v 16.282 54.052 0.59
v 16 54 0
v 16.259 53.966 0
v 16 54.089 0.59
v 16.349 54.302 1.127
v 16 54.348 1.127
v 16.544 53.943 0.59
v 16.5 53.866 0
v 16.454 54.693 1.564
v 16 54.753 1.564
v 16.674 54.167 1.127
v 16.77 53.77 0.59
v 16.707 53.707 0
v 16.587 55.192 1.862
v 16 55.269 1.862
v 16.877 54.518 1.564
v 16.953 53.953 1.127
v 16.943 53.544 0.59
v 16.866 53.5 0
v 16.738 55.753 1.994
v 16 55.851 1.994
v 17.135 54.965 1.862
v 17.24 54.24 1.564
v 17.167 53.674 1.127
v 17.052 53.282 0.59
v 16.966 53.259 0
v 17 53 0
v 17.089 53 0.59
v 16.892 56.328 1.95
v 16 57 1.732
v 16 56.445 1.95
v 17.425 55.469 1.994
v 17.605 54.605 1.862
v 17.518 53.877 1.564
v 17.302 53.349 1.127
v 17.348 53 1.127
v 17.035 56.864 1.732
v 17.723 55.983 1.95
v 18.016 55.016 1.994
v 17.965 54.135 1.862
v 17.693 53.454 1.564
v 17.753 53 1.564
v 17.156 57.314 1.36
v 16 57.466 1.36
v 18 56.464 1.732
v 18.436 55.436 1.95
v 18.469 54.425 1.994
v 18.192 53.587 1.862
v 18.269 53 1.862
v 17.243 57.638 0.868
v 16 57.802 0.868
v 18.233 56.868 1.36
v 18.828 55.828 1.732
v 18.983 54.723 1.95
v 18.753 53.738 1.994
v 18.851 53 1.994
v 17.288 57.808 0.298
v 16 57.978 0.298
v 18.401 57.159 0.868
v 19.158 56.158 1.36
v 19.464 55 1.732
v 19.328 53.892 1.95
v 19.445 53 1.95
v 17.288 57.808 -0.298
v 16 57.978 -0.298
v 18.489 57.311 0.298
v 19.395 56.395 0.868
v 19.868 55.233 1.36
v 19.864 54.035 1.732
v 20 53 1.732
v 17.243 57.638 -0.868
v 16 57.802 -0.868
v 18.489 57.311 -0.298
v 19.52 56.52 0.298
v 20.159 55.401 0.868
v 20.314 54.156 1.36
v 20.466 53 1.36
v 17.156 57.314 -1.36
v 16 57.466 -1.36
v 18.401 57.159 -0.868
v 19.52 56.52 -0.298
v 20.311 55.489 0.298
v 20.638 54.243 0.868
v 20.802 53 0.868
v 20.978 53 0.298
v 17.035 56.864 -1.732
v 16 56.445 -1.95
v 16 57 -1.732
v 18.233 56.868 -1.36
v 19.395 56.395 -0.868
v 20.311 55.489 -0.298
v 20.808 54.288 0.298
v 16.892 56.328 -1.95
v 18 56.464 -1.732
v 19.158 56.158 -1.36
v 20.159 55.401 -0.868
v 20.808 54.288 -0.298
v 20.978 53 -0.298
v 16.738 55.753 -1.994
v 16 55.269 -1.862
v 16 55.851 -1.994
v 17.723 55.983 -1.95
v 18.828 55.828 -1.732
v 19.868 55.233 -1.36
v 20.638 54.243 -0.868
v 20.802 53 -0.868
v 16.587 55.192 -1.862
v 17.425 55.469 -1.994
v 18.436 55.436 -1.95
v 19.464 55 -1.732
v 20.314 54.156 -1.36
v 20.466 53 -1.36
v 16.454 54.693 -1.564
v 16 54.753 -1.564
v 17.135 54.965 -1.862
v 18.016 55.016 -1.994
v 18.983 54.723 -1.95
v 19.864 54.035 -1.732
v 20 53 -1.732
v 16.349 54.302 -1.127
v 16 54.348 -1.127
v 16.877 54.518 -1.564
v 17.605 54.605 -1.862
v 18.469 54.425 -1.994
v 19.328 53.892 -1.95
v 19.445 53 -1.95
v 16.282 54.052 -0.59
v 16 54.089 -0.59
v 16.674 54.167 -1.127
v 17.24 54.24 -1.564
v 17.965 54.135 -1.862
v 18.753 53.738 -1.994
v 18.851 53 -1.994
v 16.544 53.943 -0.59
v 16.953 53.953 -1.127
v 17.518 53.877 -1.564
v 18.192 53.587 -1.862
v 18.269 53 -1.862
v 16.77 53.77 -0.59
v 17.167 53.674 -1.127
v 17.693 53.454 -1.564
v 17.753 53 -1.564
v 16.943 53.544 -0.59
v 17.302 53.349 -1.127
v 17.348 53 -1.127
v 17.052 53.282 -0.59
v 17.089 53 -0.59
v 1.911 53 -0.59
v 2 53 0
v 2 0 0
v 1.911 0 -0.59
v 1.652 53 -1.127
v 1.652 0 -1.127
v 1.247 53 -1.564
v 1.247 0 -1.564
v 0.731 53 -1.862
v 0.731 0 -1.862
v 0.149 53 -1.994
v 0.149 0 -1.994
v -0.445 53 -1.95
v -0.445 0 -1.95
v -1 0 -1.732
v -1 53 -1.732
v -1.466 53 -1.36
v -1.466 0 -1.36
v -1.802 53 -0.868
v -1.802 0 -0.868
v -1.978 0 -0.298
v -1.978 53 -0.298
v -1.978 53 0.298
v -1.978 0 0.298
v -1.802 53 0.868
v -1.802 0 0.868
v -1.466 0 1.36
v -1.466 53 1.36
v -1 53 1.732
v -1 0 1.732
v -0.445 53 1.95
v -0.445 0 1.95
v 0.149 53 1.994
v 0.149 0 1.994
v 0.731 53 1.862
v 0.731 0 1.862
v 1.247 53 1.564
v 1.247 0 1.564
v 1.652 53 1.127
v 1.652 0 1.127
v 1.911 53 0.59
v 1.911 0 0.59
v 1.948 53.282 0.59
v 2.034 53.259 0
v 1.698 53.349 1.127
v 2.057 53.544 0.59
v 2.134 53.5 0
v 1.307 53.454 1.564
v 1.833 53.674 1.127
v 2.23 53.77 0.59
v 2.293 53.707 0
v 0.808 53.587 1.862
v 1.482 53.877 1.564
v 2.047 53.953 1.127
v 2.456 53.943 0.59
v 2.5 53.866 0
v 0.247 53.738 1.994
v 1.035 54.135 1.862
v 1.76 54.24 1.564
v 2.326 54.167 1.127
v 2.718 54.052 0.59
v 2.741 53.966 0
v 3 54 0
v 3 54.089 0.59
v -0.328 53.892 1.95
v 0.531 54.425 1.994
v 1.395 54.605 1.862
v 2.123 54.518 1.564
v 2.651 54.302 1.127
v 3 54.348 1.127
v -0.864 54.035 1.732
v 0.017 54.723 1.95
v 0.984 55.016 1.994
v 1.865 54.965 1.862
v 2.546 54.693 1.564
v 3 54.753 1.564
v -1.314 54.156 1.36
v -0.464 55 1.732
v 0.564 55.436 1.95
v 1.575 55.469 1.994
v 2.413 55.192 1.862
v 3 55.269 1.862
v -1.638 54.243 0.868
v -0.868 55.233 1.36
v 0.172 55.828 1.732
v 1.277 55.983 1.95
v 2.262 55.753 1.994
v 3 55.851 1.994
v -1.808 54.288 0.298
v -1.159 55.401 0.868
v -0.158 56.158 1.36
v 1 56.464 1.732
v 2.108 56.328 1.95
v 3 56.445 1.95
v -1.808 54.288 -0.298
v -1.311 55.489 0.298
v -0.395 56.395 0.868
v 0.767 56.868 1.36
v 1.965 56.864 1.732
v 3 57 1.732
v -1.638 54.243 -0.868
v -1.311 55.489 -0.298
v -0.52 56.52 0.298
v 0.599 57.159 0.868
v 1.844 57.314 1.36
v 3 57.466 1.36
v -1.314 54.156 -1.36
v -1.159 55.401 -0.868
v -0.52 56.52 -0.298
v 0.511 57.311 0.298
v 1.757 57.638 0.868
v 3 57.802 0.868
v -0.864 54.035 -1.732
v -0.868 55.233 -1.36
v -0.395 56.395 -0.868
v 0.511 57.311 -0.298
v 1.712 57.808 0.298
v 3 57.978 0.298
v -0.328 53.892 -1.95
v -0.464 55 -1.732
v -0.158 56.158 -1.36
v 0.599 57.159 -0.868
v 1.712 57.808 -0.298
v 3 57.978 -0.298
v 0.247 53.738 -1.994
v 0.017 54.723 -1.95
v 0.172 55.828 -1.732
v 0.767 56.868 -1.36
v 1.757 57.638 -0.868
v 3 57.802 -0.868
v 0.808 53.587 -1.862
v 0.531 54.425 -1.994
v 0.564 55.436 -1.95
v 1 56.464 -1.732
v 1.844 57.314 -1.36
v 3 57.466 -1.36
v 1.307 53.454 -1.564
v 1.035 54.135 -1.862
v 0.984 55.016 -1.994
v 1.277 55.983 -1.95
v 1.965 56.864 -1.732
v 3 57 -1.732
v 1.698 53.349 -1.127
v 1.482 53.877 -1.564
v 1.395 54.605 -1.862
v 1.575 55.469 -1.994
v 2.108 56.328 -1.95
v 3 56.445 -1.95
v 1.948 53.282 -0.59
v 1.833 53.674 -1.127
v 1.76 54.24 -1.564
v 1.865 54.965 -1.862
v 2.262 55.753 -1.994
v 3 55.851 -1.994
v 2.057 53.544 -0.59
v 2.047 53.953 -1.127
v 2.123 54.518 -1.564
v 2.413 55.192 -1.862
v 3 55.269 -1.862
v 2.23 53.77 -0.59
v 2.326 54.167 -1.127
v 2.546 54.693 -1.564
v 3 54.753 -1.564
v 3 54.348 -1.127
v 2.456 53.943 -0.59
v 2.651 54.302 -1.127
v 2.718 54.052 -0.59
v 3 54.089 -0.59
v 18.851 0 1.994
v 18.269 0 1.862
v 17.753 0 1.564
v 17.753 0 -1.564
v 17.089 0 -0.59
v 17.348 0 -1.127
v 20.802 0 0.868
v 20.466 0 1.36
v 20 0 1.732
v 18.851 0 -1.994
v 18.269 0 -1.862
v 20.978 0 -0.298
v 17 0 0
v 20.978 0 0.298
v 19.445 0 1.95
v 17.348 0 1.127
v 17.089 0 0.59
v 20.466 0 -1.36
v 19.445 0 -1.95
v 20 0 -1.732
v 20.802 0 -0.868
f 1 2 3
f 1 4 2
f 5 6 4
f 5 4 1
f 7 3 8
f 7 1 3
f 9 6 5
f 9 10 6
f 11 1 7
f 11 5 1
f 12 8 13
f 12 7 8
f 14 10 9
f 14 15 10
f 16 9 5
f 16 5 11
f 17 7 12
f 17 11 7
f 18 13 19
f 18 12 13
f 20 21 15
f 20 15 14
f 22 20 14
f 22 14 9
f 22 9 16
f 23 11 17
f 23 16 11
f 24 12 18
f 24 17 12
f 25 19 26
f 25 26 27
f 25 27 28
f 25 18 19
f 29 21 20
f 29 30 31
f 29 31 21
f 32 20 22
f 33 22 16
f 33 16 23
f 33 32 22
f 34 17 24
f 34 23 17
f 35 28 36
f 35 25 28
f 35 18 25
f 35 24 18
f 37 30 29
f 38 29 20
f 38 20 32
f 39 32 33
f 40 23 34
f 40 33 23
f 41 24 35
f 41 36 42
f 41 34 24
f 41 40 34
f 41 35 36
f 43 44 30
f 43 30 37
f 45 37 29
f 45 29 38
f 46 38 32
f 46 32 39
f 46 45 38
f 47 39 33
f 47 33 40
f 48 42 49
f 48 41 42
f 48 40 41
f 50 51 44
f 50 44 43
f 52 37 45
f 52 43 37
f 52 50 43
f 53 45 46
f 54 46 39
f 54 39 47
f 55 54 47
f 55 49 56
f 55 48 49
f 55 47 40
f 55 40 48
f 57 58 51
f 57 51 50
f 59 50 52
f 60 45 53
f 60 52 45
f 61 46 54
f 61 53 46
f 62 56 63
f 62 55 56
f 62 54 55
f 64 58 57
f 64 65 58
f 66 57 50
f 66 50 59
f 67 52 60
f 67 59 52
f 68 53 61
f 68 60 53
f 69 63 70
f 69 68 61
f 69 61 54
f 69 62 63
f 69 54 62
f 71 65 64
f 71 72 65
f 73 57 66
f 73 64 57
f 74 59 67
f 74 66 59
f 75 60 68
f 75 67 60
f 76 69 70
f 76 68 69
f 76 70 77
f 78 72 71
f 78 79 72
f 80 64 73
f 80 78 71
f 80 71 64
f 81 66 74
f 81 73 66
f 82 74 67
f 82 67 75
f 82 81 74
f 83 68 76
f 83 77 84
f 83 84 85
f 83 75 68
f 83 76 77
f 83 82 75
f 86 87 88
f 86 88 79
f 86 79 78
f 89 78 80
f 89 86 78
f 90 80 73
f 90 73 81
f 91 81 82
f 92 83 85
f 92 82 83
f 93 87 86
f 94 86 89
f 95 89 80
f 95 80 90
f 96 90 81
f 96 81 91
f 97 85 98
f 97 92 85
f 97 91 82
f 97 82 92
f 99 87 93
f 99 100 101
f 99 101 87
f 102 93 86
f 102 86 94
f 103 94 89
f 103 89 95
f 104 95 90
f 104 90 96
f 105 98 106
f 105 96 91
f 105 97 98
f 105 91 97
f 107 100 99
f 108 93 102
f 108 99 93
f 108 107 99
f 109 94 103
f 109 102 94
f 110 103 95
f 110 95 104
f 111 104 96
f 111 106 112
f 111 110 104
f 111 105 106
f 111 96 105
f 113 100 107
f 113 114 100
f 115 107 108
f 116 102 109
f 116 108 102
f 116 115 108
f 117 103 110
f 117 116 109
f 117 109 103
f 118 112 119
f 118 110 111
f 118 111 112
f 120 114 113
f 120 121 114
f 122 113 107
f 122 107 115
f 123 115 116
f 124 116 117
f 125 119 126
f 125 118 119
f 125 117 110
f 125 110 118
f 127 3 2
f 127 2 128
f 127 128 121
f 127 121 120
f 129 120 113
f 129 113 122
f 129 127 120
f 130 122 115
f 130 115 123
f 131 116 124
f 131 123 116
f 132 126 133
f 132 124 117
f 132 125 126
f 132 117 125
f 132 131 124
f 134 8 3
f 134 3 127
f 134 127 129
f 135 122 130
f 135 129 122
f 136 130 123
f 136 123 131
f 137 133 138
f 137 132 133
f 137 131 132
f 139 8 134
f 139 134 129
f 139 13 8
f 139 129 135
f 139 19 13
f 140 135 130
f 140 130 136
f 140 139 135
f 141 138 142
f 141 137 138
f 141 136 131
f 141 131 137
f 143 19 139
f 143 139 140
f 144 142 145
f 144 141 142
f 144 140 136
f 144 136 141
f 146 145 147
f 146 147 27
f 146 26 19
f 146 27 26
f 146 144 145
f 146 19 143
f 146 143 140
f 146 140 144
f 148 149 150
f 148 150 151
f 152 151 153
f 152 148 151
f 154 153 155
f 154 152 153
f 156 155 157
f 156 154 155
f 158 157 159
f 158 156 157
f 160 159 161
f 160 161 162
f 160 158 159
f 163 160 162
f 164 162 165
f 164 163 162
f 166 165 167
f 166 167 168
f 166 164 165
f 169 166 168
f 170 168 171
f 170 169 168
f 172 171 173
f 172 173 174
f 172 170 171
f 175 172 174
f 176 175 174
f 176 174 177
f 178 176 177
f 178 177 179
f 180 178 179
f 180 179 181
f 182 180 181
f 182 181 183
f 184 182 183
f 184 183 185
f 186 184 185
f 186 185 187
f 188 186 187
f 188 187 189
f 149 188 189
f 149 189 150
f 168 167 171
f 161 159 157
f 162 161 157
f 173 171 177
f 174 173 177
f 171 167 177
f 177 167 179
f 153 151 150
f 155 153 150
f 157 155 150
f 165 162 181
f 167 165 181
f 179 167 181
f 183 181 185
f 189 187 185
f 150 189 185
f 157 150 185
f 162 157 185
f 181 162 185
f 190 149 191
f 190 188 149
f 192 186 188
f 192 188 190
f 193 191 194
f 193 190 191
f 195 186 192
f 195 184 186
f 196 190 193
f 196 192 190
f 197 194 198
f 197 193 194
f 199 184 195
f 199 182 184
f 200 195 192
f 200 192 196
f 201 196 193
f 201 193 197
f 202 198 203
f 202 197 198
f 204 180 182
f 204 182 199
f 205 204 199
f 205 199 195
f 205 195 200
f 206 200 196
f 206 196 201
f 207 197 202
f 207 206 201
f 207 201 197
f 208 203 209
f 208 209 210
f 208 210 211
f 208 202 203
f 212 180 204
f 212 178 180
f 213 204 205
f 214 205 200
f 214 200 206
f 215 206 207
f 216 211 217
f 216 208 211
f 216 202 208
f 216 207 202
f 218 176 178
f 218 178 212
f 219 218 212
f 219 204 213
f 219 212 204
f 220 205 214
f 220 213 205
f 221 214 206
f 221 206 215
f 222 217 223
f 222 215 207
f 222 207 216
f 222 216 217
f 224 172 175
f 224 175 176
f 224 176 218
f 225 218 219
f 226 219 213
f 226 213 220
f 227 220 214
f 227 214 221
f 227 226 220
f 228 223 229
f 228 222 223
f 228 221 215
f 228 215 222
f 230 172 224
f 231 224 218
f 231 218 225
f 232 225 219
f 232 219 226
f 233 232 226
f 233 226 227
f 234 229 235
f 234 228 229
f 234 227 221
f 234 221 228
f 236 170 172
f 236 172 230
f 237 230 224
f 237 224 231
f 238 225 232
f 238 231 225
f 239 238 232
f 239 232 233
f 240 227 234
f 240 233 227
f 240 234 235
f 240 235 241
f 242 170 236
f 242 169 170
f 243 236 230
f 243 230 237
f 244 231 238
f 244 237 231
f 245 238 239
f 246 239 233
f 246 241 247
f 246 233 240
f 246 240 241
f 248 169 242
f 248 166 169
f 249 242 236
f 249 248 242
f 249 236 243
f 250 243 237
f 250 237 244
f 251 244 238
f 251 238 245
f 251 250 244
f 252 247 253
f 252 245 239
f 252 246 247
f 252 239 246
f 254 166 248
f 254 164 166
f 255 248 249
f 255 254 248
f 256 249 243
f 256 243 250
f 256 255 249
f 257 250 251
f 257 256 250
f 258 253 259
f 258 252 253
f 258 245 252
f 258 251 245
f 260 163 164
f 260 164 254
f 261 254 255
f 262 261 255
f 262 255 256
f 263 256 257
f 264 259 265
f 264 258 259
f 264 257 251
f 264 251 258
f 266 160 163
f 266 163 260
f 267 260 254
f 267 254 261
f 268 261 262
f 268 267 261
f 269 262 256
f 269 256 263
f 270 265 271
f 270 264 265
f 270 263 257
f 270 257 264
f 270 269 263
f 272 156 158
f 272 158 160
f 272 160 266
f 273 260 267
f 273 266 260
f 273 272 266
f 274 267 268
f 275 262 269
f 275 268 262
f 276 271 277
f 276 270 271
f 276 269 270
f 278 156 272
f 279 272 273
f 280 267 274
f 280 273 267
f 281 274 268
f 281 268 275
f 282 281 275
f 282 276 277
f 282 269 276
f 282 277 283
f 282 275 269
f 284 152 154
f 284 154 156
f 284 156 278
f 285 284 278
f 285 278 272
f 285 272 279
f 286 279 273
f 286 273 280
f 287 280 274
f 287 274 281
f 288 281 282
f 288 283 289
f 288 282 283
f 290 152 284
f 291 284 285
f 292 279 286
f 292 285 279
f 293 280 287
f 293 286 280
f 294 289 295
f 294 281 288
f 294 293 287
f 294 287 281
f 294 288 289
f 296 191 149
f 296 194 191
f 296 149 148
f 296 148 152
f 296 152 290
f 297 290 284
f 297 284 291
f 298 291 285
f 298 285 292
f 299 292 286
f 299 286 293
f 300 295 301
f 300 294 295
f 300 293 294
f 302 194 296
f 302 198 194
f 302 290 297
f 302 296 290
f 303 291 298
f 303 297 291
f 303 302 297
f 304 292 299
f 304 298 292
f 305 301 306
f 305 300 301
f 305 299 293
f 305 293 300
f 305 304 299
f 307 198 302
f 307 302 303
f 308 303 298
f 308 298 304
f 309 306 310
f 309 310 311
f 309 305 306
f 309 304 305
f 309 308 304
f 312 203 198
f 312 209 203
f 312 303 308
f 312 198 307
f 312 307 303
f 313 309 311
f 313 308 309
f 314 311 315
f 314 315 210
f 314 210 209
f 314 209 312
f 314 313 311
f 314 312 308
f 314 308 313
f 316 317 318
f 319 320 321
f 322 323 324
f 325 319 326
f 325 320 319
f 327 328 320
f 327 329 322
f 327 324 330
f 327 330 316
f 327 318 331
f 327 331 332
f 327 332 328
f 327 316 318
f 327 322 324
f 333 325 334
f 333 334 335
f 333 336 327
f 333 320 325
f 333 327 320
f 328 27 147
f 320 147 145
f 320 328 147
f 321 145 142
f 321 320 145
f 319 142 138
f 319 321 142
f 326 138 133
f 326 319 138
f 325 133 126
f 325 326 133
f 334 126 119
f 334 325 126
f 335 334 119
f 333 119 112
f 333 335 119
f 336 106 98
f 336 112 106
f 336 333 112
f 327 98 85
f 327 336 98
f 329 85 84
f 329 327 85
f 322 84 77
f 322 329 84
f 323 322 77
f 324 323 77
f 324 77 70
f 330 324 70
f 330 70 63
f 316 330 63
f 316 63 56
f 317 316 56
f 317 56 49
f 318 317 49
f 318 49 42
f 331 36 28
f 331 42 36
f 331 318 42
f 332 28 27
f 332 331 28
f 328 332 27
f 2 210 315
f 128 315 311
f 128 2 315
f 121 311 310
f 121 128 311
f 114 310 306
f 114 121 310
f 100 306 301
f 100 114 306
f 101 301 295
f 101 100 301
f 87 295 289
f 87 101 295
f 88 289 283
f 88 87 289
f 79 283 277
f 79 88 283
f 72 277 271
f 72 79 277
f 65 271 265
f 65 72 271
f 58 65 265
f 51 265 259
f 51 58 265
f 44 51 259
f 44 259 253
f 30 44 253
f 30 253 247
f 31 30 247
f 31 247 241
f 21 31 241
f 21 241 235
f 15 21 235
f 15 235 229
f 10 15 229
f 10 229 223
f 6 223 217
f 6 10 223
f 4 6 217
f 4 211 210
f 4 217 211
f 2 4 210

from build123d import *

# Parameters (mm, degrees)
ESQUISSE2_R = 2


with BuildPart() as part:
    # Balayage1: sweep along a path in Esquisse1
    with BuildLine(Plane.XY) as balayage1_path:
        Line((0, 0), (0, 53))
        ThreePointArc((0, 53), (0.878679656, 55.121320344), (3, 56))
        Line((3, 56), (16, 56))
        ThreePointArc((16, 56), (18.121320344, 55.121320344), (19, 53))
        Line((19, 53), (19, 0))
    # Esquisse2 → Balayage1 (sweep)
    with BuildSketch(Plane(origin=(0, 0, 0), x_dir=(1, 0, 0), z_dir=(0, 1, 0))):
        Circle(ESQUISSE2_R)
    sweep(path=balayage1_path.line)


solid = part.part
